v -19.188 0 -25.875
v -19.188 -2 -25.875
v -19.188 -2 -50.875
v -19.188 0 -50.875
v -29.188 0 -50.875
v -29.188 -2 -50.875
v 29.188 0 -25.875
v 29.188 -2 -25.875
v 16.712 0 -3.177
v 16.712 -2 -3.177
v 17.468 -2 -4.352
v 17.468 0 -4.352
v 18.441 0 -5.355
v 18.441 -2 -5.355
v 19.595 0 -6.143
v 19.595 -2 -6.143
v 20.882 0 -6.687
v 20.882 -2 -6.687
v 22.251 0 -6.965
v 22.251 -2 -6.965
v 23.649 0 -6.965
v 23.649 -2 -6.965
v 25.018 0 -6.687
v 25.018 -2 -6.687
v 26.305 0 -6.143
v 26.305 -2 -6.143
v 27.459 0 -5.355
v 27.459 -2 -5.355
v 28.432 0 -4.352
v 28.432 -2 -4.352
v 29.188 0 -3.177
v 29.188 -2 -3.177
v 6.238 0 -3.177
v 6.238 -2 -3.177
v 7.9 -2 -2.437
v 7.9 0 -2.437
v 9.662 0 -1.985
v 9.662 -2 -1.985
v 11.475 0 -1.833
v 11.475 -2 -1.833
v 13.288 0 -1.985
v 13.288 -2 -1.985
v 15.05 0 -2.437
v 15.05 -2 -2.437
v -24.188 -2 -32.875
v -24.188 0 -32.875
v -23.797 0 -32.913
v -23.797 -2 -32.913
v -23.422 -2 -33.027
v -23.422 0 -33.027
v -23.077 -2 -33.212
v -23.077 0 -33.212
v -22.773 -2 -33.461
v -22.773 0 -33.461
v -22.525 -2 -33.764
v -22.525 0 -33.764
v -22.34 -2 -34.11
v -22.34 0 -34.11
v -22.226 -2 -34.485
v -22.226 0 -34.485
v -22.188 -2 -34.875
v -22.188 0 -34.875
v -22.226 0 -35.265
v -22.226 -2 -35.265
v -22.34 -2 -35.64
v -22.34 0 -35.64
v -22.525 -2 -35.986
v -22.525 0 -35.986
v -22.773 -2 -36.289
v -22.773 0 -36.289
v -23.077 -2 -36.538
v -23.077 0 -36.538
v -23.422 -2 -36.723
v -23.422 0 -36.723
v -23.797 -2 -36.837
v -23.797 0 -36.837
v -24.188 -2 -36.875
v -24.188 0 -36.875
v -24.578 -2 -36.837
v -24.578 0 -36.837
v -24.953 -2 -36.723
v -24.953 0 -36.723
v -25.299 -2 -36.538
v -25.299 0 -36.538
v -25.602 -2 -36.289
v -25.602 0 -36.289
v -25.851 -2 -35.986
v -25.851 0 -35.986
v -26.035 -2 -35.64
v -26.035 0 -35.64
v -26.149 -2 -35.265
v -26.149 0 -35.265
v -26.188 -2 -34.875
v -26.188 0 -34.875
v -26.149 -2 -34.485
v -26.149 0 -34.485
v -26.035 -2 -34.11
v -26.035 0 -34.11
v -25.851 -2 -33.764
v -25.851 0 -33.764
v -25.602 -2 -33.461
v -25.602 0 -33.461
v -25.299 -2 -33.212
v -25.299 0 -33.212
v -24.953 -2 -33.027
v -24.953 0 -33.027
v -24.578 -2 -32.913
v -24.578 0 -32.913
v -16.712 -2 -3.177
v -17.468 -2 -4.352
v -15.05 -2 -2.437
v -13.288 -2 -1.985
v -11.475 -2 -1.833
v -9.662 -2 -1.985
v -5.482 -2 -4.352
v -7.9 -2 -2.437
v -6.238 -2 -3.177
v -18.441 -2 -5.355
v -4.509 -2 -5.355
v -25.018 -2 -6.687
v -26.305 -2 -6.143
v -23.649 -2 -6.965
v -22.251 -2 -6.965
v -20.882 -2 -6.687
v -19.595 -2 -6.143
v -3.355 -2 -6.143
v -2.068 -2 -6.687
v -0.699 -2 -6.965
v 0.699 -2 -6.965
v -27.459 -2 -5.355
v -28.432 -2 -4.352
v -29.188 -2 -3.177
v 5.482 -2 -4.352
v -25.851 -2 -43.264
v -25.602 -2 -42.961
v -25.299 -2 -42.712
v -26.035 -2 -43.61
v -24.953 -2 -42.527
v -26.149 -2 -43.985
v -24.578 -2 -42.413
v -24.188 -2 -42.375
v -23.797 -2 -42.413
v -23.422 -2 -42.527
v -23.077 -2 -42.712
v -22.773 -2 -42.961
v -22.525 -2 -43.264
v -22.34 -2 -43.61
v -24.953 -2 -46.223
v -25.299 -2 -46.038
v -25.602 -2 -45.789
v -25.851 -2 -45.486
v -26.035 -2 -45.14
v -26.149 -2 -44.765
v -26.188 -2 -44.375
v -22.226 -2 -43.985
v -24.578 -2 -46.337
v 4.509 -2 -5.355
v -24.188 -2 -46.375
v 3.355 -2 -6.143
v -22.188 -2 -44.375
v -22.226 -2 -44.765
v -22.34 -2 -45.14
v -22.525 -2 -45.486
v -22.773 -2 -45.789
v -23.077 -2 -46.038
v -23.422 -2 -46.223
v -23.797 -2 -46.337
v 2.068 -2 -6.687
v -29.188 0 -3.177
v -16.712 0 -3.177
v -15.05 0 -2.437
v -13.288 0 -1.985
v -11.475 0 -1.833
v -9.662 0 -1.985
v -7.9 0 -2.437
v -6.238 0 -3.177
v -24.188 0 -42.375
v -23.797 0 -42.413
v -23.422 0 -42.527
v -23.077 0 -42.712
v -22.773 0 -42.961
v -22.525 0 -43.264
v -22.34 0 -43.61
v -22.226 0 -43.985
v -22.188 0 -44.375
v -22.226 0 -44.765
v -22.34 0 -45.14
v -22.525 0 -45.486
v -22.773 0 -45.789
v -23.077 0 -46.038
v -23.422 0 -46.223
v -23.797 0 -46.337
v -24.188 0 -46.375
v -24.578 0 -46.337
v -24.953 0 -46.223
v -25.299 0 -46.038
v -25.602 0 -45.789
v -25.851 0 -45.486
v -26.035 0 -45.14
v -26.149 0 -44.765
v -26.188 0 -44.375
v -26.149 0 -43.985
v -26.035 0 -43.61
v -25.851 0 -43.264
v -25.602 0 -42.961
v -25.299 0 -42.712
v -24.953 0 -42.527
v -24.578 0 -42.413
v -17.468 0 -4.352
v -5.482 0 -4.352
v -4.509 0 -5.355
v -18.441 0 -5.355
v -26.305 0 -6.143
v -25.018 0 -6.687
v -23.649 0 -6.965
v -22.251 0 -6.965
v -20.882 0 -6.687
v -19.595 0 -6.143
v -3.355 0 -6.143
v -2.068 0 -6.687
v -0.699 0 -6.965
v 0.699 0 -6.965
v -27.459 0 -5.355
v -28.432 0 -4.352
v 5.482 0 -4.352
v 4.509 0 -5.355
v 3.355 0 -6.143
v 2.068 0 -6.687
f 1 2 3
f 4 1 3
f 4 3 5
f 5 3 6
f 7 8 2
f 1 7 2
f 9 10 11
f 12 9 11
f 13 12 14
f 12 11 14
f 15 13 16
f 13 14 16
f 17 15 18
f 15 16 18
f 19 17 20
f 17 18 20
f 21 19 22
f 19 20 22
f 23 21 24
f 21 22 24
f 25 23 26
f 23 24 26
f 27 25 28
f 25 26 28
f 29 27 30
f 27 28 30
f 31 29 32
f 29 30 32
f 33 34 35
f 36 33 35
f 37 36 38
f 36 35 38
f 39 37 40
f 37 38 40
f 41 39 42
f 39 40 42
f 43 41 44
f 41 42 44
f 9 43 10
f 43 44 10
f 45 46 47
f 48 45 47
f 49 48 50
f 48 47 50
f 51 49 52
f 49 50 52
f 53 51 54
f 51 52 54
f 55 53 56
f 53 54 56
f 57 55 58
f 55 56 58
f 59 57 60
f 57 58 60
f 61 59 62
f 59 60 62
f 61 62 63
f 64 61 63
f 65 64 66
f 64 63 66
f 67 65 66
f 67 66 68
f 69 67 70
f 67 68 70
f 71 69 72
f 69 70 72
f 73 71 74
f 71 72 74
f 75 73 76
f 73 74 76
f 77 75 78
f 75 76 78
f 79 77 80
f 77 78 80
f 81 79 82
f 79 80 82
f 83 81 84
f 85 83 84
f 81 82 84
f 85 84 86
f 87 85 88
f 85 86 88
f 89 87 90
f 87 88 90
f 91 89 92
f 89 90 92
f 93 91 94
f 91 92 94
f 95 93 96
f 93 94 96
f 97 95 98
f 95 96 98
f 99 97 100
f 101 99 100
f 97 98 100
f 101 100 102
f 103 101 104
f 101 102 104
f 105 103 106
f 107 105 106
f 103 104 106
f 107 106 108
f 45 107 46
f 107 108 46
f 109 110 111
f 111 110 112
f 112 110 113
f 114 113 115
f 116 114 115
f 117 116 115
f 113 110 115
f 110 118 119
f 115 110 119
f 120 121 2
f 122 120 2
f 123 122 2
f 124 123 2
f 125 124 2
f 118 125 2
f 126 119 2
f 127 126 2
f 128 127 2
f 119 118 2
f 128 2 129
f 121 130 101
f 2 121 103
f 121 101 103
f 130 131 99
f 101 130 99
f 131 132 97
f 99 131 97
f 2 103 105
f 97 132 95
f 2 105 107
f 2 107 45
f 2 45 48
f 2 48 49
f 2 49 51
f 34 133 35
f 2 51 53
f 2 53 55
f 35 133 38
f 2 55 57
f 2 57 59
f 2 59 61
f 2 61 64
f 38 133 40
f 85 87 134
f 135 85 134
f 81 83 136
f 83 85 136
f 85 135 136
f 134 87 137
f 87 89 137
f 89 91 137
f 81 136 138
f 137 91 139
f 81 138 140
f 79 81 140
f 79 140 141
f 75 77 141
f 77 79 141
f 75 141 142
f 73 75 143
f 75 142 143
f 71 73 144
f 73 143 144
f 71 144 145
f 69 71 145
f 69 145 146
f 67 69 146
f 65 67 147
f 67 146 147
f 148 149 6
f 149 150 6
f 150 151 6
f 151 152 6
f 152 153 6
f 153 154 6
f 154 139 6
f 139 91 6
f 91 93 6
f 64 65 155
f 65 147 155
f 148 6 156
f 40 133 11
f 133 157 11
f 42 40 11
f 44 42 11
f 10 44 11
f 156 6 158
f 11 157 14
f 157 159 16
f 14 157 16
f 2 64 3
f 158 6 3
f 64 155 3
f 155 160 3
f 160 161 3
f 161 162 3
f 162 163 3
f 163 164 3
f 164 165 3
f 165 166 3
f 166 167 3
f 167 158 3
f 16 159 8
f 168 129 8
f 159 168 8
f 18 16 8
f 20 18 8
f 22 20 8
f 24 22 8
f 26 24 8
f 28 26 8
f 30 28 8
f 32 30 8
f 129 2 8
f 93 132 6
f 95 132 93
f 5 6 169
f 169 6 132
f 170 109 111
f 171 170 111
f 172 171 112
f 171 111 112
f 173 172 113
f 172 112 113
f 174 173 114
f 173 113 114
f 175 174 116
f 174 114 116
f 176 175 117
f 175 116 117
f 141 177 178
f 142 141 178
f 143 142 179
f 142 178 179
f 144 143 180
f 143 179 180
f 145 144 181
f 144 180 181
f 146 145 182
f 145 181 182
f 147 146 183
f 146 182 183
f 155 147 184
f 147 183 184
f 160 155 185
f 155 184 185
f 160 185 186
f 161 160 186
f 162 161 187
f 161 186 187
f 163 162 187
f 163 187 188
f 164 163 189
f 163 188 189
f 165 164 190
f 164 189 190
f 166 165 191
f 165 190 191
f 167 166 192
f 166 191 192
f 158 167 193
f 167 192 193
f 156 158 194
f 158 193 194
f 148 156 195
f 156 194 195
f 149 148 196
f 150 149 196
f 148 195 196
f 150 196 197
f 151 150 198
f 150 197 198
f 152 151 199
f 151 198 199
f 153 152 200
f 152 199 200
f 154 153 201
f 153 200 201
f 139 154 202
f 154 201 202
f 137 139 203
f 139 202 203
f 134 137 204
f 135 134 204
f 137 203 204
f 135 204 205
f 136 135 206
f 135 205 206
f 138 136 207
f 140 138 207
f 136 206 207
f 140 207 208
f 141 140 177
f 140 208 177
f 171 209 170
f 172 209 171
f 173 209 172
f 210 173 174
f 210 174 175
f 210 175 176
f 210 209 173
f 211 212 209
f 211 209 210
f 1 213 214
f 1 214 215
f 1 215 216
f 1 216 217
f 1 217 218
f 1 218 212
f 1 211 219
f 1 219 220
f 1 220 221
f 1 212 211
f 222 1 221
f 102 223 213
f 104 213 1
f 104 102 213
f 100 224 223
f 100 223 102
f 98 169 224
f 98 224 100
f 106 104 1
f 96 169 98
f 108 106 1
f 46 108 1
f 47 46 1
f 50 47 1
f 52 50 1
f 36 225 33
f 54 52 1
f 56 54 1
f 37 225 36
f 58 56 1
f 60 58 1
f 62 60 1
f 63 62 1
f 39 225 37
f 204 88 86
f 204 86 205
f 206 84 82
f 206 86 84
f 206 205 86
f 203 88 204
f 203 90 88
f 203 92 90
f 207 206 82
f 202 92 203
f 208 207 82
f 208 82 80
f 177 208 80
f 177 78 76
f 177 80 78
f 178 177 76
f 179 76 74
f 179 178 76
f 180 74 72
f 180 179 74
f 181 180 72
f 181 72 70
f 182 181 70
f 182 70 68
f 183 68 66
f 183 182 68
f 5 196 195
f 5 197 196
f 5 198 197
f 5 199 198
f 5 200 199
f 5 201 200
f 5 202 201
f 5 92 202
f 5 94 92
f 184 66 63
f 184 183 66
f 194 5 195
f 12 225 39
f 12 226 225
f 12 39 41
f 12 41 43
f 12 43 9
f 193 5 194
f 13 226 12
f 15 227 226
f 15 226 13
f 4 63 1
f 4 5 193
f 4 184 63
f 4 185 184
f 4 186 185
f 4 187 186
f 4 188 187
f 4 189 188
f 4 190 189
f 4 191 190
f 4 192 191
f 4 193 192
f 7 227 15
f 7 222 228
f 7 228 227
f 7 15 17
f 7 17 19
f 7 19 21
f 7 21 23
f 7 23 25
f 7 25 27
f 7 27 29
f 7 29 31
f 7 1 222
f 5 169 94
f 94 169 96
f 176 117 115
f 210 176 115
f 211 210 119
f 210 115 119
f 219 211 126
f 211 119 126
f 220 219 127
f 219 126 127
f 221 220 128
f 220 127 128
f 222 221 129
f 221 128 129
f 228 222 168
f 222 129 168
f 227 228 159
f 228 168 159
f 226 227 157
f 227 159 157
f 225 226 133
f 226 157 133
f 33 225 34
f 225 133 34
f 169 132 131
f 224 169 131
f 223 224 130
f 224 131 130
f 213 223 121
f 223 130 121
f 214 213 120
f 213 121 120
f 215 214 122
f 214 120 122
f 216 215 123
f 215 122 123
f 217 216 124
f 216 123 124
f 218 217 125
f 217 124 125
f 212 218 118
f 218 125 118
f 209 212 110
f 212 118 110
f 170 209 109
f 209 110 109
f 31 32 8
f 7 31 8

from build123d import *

# Parameters (mm, degrees)
BASE_FLANGE1_START = -2
BASE_FLANGE1_DEPTH = 2
SKETCH8_R          = 2
CUT_EXTRUDE1_DEPTH = 2


# Read off the part's stored shape, not the designer's step: Base-Flange1
with BuildPart() as part:
    # Base-Flange1 outline → Base-Flange1 (new body)
    with BuildSketch(Plane(origin=(0, 0, 0), x_dir=(1, 0, 0), z_dir=(0, 1, 0)).offset(BASE_FLANGE1_START)):
        with BuildLine():
            ThreePointArc((-29.187643745, 3.176759435), (-22.95, 7), (-16.712356255, 3.176759435))
            ThreePointArc((-16.712356255, 3.176759435), (-11.475, 1.832537182), (-6.237643745, 3.176759435))
            ThreePointArc((-6.237643745, 3.176759435), (0, 7), (6.237643745, 3.176759435))
            ThreePointArc((6.237643745, 3.176759435), (11.475, 1.832537182), (16.712356255, 3.176759435))
            ThreePointArc((16.712356255, 3.176759435), (22.95, 7), (29.187643745, 3.176759435))
            Line((29.187643745, 3.176759435), (29.187643745, 25.875))
            Line((29.187643745, 25.875), (-19.187643745, 25.875))
            Line((-19.187643745, 25.875), (-19.187643745, 50.875))
            Line((-19.187643745, 50.875), (-29.187643745, 50.875))
            Line((-29.187643745, 50.875), (-29.187643745, 3.176759435))
        make_face()
    extrude(amount=BASE_FLANGE1_DEPTH)

    # Sketch8 → Cut-Extrude1 (cut)
    with BuildSketch(Plane(origin=(0, 0, 0), x_dir=(1, 0, 0), z_dir=(0, 1, 0))):
        with Locations(Location((-24.187643745, 44.375, 0), (0, 0, 270))):
            Circle(SKETCH8_R)
        with Locations(Location((-24.187643745, 34.875, 0), (0, 0, 270))):
            Circle(SKETCH8_R)
    extrude(amount=-CUT_EXTRUDE1_DEPTH, mode=Mode.SUBTRACT)


solid = part.part
